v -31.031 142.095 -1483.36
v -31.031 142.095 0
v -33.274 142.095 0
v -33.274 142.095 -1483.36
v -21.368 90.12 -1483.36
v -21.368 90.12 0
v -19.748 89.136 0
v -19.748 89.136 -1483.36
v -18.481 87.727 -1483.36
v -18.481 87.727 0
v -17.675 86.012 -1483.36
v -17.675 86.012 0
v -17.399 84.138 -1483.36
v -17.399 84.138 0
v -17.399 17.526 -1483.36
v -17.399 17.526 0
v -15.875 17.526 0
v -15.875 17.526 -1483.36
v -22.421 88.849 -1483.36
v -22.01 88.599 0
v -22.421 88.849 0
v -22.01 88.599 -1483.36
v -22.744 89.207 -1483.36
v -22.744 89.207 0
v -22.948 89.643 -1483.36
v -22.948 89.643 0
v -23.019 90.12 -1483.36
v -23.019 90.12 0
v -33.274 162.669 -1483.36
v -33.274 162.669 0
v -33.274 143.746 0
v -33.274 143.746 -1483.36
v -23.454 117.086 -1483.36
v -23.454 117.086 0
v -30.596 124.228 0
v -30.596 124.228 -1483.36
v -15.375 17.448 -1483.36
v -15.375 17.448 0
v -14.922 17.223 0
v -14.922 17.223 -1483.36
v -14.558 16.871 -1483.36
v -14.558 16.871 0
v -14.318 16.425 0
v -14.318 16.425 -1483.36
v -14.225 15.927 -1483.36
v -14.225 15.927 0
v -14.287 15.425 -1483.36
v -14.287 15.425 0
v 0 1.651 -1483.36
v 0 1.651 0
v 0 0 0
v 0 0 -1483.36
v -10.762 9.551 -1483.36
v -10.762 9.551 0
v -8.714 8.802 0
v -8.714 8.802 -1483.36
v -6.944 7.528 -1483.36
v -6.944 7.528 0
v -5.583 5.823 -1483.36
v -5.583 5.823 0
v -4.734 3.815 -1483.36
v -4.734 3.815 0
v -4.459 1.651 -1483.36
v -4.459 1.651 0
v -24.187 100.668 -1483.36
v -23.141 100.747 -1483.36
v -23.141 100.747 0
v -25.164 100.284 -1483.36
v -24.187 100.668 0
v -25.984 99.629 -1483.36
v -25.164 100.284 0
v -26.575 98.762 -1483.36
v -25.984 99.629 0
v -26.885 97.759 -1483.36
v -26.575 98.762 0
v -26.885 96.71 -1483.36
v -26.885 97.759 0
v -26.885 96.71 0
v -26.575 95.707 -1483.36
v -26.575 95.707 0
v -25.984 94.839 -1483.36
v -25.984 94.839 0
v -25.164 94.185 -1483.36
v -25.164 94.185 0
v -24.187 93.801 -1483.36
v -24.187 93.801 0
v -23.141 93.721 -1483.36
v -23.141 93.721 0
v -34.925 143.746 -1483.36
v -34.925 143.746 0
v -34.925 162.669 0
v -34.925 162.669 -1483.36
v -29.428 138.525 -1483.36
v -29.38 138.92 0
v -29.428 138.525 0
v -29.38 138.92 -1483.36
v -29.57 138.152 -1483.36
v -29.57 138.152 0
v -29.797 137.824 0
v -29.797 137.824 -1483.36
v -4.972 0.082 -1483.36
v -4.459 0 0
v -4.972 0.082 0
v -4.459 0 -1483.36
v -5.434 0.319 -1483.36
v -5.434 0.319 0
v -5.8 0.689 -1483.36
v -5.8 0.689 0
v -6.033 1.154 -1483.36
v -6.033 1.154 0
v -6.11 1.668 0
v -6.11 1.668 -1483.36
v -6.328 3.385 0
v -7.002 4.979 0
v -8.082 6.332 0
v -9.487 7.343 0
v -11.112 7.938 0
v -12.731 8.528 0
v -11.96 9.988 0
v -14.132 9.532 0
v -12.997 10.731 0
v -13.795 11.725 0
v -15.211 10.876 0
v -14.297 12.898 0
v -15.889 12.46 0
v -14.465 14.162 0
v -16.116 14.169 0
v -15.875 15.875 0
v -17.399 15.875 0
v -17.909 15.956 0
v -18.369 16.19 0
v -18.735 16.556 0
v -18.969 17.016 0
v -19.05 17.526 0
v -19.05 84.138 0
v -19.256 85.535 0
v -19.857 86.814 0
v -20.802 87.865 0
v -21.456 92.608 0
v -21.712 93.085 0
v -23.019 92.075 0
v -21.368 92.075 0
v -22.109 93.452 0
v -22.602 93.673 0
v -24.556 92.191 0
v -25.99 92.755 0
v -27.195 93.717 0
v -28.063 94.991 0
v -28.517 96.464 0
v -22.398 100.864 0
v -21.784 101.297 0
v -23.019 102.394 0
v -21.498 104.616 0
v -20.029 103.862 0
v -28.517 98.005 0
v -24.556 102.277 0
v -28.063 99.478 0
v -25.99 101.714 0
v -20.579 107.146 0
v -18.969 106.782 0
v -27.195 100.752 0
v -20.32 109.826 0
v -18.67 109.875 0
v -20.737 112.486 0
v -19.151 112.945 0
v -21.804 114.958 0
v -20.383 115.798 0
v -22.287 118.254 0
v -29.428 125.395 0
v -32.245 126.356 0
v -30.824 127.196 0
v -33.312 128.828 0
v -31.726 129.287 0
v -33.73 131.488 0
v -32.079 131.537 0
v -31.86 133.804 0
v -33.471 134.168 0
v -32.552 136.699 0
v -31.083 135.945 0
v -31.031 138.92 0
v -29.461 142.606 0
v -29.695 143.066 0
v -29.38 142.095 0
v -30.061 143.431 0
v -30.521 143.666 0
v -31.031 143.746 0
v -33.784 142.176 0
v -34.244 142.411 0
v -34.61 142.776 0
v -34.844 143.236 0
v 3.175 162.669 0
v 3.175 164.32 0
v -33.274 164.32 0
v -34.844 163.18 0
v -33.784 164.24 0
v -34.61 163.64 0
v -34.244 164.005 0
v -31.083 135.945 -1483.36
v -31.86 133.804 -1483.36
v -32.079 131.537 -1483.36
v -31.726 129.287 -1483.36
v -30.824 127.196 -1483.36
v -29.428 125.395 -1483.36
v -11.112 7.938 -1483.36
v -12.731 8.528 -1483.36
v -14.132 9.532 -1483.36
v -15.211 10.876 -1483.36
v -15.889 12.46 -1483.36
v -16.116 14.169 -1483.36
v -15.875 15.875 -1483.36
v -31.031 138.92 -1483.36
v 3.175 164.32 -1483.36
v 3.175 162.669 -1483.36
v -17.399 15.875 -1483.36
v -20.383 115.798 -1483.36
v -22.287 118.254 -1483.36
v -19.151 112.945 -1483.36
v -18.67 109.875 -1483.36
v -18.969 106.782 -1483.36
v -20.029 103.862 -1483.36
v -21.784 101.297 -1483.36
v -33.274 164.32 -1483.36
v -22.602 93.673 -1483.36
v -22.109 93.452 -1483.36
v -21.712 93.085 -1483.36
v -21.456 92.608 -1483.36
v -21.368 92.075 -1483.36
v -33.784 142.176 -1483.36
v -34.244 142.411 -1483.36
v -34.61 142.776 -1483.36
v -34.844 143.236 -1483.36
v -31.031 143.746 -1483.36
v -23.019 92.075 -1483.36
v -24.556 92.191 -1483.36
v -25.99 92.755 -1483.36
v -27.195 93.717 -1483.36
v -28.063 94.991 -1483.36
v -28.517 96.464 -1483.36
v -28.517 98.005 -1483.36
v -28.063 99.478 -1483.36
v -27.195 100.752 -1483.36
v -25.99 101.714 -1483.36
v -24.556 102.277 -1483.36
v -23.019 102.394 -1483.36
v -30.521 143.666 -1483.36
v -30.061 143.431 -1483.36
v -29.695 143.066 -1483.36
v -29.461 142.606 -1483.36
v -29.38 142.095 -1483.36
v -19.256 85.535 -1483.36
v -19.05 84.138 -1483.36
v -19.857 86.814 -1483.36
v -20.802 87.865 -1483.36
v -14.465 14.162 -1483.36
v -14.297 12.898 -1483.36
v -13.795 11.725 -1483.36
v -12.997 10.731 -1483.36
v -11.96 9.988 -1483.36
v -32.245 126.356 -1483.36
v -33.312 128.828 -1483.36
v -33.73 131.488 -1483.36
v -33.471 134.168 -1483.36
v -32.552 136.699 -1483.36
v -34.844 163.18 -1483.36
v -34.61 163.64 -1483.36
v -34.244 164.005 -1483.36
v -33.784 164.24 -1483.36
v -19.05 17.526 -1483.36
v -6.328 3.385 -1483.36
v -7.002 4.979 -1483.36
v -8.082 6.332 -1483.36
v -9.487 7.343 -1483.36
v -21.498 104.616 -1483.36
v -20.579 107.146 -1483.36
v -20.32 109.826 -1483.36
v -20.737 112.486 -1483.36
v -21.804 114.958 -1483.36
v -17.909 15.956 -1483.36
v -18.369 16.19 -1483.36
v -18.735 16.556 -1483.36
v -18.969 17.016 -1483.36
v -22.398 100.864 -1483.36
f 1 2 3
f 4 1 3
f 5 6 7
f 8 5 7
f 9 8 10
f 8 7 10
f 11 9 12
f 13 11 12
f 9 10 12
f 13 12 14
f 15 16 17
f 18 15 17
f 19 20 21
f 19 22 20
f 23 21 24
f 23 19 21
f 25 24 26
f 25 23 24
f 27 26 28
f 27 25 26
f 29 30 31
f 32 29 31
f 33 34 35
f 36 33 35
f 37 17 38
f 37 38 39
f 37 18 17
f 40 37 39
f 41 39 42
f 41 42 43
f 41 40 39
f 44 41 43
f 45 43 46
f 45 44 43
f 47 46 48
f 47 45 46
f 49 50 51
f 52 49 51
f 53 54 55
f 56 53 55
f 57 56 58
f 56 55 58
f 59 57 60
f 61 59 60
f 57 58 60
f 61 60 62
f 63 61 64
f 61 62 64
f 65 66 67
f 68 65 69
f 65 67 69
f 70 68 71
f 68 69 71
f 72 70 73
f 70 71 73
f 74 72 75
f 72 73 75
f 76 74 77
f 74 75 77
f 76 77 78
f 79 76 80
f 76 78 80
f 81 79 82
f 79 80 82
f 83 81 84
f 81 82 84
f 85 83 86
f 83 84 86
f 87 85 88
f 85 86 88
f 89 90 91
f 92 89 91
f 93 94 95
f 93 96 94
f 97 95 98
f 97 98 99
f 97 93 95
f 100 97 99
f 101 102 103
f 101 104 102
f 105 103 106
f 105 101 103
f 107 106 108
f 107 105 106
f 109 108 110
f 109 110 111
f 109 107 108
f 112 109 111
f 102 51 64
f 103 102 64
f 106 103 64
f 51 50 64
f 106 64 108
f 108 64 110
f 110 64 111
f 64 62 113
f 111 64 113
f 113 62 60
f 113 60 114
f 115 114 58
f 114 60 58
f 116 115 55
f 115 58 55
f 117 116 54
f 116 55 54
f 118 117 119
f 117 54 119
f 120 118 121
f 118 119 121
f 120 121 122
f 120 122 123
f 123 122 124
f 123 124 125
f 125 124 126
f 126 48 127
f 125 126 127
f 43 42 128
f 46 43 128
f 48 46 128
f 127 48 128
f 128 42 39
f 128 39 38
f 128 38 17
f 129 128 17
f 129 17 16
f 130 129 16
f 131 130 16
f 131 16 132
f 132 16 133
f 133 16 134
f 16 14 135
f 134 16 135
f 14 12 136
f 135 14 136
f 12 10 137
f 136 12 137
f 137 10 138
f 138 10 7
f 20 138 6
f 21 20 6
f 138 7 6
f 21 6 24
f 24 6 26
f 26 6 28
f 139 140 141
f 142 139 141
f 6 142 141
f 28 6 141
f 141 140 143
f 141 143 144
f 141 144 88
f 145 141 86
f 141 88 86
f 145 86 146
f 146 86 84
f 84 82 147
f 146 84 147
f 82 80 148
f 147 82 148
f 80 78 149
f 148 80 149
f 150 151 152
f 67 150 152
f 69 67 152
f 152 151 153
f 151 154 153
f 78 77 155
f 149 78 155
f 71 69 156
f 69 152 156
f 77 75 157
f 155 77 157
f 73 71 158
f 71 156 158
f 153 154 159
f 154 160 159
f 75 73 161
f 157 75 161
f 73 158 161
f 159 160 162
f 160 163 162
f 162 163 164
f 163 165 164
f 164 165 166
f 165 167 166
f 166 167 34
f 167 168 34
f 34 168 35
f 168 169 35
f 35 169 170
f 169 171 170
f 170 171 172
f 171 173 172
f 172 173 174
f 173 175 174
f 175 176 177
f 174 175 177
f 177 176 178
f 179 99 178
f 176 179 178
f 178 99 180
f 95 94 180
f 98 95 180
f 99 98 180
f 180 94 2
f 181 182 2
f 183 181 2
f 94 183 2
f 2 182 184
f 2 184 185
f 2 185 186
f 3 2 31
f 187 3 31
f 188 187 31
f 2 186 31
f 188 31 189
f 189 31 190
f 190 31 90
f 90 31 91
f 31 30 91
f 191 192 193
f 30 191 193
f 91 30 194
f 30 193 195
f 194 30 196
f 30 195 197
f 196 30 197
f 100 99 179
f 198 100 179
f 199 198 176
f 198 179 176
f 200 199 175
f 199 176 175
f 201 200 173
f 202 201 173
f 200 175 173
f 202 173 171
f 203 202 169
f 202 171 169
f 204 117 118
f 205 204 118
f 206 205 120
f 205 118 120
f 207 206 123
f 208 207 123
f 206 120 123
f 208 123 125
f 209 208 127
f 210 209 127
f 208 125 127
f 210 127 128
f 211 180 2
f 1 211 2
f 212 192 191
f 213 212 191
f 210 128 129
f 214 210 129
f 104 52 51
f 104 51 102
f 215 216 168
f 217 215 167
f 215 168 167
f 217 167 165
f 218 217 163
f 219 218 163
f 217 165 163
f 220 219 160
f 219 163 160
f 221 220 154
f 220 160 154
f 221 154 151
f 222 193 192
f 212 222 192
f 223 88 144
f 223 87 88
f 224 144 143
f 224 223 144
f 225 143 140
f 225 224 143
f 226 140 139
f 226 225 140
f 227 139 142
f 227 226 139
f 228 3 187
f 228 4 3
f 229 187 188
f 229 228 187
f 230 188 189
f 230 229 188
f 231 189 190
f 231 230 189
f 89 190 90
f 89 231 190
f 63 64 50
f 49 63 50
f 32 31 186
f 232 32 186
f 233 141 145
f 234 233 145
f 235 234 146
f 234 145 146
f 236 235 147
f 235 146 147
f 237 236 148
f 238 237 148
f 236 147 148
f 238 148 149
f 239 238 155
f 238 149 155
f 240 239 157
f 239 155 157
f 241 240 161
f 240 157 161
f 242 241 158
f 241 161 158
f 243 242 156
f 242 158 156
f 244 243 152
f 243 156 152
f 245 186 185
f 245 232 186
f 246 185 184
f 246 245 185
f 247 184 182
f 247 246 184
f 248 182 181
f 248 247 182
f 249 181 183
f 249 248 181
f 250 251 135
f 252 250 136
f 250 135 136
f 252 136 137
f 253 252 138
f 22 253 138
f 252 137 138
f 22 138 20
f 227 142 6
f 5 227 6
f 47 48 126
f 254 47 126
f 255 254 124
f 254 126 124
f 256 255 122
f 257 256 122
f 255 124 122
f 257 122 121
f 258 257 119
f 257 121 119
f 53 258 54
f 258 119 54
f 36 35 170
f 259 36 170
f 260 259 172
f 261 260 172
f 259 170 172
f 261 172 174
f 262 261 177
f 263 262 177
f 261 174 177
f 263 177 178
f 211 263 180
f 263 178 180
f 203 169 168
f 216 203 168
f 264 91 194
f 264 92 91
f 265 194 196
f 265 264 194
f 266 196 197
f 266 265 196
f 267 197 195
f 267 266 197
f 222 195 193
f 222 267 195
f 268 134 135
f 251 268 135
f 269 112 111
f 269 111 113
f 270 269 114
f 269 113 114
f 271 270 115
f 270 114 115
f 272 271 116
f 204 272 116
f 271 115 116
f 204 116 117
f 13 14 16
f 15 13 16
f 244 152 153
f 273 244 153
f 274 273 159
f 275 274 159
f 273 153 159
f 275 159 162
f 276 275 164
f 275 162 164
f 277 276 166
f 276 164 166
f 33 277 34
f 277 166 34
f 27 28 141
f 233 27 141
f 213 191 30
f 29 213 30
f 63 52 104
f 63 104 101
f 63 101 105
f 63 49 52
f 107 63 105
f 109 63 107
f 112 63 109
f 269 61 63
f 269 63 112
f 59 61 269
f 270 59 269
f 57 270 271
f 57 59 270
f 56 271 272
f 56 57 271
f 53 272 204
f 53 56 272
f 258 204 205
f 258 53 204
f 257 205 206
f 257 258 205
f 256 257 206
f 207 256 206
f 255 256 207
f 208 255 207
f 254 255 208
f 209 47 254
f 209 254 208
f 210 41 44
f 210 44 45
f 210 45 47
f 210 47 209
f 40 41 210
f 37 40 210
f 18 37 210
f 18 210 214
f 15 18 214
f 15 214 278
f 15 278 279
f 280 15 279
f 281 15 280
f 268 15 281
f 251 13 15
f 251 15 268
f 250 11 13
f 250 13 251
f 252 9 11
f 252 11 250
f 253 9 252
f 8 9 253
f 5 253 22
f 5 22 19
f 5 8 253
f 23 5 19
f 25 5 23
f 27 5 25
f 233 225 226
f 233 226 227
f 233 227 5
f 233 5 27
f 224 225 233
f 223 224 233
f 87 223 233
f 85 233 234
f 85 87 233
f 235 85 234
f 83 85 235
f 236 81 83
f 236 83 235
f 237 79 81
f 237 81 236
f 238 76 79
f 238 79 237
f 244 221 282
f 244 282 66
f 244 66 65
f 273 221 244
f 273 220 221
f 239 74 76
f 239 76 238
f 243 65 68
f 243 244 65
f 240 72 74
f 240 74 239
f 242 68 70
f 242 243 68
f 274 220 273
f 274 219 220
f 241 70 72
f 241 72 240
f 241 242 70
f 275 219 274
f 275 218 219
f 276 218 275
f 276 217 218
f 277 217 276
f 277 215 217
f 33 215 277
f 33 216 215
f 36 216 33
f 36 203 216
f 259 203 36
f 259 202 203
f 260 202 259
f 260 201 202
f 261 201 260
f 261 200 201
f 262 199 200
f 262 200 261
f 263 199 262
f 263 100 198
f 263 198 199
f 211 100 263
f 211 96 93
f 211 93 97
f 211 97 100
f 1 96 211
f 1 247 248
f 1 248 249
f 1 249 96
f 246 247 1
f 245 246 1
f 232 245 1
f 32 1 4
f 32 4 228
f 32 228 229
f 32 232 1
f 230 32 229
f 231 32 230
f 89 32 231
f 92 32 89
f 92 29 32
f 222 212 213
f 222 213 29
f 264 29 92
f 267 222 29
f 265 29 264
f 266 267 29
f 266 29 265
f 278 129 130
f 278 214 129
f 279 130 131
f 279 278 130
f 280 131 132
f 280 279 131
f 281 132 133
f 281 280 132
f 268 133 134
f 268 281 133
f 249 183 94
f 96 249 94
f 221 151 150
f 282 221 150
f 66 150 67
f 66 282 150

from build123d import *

# Parameters (mm, degrees)
EXTRUDE_THIN1_DEPTH = 1483.36
FILLET1_R           = 1.651


with BuildPart() as part:
    # Sketch1 → Extrude-Thin1 (new body)
    with BuildSketch(Plane.XY):
        with BuildLine():
            Line((0, 0), (-6.35, 0))
            ThreePointArc((-6.35, 0), (-7.014161405, 4.999003157), (-11.1125, 7.9375))
            ThreePointArc((-11.1125, 7.9375), (-15.210838595, 10.875996843), (-15.875, 15.875))
            Line((-15.875, 15.875), (-19.05, 15.875))
            Line((-19.05, 15.875), (-19.05, 84.1375))
            ThreePointArc((-19.05, 84.1375), (-20.172243592, 87.23719284), (-23.01875, 88.9))
            Line((-23.01875, 88.9), (-23.01875, 92.075))
            ThreePointArc((-23.01875, 92.075), (-28.575, 97.234375), (-23.01875, 102.39375))
            ThreePointArc((-23.01875, 102.39375), (-20.320127613, 109.826332694), (-23.453963425, 117.086148215))
            Line((-23.453963425, 117.086148215), (-30.595841102, 124.228025892))
            ThreePointArc((-30.595841102, 124.228025892), (-33.729676913, 131.487841413), (-31.031054527, 138.920424107))
            Line((-31.031054527, 138.920424107), (-31.031054527, 142.095424107))
            Line((-31.031054527, 142.095424107), (-34.925, 142.095424107))
            Line((-34.925, 142.095424107), (-34.925, 164.320424107))
            Line((-34.925, 164.320424107), (3.175, 164.320424107))
            Line((3.175, 164.320424107), (3.175, 162.669424107))
            Line((3.175, 162.669424107), (-33.274, 162.669424107))
            Line((-33.274, 162.669424107), (-33.274, 143.746424107))
            Line((-33.274, 143.746424107), (-29.380054527, 143.746424107))
            Line((-29.380054527, 143.746424107), (-29.380054527, 138.262766033))
            ThreePointArc((-29.380054527, 138.262766033), (-32.083310998, 131.839180164), (-29.428407806, 125.395459188))
            Line((-29.428407806, 125.395459188), (-22.286530129, 118.253581511))
            ThreePointArc((-22.286530129, 118.253581511), (-18.6648529, 109.406728179), (-22.4324376, 100.621020162))
            ThreePointArc((-22.4324376, 100.621020162), (-26.874175858, 96.64400772), (-21.36775, 94.35819474))
            Line((-21.36775, 94.35819474), (-21.36775, 90.119658369))
            ThreePointArc((-21.36775, 90.119658369), (-18.481410423, 87.72697055), (-17.399, 84.1375))
            Line((-17.399, 84.1375), (-17.399, 17.526))
            Line((-17.399, 17.526), (-13.027079679, 17.526))
            ThreePointArc((-13.027079679, 17.526), (-14.286028192, 12.859392651), (-10.762347214, 9.550941671))
            ThreePointArc((-10.762347214, 9.550941671), (-6.205237007, 6.722288668), (-4.45865105, 1.651))
            Line((-4.45865105, 1.651), (0, 1.651))
            Line((0, 1.651), (0, 0))
        make_face()
    extrude(amount=-EXTRUDE_THIN1_DEPTH)

    # Fillet1
    fillet1_edges = [part.edges().sort_by_distance(p)[0] for p in [
        (-29.380054527, 143.746424107, -741.68),
        (-29.380054527, 138.262766033, -741.68),
        (-22.4324376, 100.621020162, -741.68),
        (-21.36775, 94.35819474, -741.68),
        (-13.027079679, 17.526, -741.68),
        (-6.35, 0, -741.68),
        (-19.05, 15.875, -741.68),
        (-23.01875, 88.9, -741.68),
        (-34.925, 142.095424107, -741.68),
        (-34.925, 164.320424107, -741.68),
    ]]
    fillet(fillet1_edges, radius=FILLET1_R)


solid = part.part
